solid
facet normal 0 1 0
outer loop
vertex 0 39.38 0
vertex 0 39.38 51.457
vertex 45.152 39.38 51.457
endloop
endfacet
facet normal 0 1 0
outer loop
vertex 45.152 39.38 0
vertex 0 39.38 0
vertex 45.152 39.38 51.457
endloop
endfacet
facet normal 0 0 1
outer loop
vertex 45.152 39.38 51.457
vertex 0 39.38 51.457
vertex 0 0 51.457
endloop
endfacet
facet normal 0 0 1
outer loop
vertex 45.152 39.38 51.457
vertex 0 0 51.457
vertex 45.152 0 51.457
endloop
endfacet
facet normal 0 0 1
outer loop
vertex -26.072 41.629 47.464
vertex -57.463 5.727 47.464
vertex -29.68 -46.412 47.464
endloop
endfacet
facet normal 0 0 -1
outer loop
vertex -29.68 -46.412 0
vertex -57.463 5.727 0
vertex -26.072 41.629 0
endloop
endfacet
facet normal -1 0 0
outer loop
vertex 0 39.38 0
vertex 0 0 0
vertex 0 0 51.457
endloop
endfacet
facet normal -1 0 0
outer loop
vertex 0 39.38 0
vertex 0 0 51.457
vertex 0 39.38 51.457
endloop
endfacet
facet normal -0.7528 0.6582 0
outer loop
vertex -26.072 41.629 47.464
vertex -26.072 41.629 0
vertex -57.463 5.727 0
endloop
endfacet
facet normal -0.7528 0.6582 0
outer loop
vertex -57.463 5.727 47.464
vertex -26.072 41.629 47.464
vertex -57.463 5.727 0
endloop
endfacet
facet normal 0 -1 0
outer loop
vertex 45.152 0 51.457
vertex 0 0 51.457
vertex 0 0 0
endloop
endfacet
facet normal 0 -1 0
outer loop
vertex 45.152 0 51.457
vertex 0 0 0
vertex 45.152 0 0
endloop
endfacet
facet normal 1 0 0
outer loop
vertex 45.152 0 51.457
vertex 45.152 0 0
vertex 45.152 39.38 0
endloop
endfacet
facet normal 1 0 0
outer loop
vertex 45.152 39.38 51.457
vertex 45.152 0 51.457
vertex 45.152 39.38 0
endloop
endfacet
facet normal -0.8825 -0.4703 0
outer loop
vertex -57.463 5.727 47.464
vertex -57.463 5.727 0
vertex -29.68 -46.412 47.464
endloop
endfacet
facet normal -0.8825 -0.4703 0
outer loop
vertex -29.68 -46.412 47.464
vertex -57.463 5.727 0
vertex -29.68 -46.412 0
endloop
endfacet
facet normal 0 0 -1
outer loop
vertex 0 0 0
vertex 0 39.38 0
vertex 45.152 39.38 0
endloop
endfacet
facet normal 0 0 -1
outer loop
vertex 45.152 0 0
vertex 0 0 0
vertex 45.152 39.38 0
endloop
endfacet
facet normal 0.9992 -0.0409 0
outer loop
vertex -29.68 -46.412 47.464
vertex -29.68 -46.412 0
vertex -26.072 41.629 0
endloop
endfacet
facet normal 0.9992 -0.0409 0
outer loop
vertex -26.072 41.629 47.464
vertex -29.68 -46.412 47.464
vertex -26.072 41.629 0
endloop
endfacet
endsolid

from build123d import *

# Parameters (mm, degrees)
F0_W     = 45.1518
F0_H     = 39.379802
F1_DEPTH = 51.45734
F3_DEPTH = 47.46424


with BuildPart() as f1:
    # F0 (on Top) → F1 (new body)
    with BuildSketch(Plane.XY):
        with Locations((22.5759, 19.689901)):
            Rectangle(F0_W, F0_H)
    extrude(amount=F1_DEPTH)


with BuildPart() as f3:
    # F2 (on Top) → F3 (new body)
    with BuildSketch(Plane.XY):
        Polygon((-29.679898, -46.412464), (-26.071651, 41.628778), (-57.463408, 5.726715), align=None)
    extrude(amount=F3_DEPTH)


solid = Compound([f1.part, f3.part])
